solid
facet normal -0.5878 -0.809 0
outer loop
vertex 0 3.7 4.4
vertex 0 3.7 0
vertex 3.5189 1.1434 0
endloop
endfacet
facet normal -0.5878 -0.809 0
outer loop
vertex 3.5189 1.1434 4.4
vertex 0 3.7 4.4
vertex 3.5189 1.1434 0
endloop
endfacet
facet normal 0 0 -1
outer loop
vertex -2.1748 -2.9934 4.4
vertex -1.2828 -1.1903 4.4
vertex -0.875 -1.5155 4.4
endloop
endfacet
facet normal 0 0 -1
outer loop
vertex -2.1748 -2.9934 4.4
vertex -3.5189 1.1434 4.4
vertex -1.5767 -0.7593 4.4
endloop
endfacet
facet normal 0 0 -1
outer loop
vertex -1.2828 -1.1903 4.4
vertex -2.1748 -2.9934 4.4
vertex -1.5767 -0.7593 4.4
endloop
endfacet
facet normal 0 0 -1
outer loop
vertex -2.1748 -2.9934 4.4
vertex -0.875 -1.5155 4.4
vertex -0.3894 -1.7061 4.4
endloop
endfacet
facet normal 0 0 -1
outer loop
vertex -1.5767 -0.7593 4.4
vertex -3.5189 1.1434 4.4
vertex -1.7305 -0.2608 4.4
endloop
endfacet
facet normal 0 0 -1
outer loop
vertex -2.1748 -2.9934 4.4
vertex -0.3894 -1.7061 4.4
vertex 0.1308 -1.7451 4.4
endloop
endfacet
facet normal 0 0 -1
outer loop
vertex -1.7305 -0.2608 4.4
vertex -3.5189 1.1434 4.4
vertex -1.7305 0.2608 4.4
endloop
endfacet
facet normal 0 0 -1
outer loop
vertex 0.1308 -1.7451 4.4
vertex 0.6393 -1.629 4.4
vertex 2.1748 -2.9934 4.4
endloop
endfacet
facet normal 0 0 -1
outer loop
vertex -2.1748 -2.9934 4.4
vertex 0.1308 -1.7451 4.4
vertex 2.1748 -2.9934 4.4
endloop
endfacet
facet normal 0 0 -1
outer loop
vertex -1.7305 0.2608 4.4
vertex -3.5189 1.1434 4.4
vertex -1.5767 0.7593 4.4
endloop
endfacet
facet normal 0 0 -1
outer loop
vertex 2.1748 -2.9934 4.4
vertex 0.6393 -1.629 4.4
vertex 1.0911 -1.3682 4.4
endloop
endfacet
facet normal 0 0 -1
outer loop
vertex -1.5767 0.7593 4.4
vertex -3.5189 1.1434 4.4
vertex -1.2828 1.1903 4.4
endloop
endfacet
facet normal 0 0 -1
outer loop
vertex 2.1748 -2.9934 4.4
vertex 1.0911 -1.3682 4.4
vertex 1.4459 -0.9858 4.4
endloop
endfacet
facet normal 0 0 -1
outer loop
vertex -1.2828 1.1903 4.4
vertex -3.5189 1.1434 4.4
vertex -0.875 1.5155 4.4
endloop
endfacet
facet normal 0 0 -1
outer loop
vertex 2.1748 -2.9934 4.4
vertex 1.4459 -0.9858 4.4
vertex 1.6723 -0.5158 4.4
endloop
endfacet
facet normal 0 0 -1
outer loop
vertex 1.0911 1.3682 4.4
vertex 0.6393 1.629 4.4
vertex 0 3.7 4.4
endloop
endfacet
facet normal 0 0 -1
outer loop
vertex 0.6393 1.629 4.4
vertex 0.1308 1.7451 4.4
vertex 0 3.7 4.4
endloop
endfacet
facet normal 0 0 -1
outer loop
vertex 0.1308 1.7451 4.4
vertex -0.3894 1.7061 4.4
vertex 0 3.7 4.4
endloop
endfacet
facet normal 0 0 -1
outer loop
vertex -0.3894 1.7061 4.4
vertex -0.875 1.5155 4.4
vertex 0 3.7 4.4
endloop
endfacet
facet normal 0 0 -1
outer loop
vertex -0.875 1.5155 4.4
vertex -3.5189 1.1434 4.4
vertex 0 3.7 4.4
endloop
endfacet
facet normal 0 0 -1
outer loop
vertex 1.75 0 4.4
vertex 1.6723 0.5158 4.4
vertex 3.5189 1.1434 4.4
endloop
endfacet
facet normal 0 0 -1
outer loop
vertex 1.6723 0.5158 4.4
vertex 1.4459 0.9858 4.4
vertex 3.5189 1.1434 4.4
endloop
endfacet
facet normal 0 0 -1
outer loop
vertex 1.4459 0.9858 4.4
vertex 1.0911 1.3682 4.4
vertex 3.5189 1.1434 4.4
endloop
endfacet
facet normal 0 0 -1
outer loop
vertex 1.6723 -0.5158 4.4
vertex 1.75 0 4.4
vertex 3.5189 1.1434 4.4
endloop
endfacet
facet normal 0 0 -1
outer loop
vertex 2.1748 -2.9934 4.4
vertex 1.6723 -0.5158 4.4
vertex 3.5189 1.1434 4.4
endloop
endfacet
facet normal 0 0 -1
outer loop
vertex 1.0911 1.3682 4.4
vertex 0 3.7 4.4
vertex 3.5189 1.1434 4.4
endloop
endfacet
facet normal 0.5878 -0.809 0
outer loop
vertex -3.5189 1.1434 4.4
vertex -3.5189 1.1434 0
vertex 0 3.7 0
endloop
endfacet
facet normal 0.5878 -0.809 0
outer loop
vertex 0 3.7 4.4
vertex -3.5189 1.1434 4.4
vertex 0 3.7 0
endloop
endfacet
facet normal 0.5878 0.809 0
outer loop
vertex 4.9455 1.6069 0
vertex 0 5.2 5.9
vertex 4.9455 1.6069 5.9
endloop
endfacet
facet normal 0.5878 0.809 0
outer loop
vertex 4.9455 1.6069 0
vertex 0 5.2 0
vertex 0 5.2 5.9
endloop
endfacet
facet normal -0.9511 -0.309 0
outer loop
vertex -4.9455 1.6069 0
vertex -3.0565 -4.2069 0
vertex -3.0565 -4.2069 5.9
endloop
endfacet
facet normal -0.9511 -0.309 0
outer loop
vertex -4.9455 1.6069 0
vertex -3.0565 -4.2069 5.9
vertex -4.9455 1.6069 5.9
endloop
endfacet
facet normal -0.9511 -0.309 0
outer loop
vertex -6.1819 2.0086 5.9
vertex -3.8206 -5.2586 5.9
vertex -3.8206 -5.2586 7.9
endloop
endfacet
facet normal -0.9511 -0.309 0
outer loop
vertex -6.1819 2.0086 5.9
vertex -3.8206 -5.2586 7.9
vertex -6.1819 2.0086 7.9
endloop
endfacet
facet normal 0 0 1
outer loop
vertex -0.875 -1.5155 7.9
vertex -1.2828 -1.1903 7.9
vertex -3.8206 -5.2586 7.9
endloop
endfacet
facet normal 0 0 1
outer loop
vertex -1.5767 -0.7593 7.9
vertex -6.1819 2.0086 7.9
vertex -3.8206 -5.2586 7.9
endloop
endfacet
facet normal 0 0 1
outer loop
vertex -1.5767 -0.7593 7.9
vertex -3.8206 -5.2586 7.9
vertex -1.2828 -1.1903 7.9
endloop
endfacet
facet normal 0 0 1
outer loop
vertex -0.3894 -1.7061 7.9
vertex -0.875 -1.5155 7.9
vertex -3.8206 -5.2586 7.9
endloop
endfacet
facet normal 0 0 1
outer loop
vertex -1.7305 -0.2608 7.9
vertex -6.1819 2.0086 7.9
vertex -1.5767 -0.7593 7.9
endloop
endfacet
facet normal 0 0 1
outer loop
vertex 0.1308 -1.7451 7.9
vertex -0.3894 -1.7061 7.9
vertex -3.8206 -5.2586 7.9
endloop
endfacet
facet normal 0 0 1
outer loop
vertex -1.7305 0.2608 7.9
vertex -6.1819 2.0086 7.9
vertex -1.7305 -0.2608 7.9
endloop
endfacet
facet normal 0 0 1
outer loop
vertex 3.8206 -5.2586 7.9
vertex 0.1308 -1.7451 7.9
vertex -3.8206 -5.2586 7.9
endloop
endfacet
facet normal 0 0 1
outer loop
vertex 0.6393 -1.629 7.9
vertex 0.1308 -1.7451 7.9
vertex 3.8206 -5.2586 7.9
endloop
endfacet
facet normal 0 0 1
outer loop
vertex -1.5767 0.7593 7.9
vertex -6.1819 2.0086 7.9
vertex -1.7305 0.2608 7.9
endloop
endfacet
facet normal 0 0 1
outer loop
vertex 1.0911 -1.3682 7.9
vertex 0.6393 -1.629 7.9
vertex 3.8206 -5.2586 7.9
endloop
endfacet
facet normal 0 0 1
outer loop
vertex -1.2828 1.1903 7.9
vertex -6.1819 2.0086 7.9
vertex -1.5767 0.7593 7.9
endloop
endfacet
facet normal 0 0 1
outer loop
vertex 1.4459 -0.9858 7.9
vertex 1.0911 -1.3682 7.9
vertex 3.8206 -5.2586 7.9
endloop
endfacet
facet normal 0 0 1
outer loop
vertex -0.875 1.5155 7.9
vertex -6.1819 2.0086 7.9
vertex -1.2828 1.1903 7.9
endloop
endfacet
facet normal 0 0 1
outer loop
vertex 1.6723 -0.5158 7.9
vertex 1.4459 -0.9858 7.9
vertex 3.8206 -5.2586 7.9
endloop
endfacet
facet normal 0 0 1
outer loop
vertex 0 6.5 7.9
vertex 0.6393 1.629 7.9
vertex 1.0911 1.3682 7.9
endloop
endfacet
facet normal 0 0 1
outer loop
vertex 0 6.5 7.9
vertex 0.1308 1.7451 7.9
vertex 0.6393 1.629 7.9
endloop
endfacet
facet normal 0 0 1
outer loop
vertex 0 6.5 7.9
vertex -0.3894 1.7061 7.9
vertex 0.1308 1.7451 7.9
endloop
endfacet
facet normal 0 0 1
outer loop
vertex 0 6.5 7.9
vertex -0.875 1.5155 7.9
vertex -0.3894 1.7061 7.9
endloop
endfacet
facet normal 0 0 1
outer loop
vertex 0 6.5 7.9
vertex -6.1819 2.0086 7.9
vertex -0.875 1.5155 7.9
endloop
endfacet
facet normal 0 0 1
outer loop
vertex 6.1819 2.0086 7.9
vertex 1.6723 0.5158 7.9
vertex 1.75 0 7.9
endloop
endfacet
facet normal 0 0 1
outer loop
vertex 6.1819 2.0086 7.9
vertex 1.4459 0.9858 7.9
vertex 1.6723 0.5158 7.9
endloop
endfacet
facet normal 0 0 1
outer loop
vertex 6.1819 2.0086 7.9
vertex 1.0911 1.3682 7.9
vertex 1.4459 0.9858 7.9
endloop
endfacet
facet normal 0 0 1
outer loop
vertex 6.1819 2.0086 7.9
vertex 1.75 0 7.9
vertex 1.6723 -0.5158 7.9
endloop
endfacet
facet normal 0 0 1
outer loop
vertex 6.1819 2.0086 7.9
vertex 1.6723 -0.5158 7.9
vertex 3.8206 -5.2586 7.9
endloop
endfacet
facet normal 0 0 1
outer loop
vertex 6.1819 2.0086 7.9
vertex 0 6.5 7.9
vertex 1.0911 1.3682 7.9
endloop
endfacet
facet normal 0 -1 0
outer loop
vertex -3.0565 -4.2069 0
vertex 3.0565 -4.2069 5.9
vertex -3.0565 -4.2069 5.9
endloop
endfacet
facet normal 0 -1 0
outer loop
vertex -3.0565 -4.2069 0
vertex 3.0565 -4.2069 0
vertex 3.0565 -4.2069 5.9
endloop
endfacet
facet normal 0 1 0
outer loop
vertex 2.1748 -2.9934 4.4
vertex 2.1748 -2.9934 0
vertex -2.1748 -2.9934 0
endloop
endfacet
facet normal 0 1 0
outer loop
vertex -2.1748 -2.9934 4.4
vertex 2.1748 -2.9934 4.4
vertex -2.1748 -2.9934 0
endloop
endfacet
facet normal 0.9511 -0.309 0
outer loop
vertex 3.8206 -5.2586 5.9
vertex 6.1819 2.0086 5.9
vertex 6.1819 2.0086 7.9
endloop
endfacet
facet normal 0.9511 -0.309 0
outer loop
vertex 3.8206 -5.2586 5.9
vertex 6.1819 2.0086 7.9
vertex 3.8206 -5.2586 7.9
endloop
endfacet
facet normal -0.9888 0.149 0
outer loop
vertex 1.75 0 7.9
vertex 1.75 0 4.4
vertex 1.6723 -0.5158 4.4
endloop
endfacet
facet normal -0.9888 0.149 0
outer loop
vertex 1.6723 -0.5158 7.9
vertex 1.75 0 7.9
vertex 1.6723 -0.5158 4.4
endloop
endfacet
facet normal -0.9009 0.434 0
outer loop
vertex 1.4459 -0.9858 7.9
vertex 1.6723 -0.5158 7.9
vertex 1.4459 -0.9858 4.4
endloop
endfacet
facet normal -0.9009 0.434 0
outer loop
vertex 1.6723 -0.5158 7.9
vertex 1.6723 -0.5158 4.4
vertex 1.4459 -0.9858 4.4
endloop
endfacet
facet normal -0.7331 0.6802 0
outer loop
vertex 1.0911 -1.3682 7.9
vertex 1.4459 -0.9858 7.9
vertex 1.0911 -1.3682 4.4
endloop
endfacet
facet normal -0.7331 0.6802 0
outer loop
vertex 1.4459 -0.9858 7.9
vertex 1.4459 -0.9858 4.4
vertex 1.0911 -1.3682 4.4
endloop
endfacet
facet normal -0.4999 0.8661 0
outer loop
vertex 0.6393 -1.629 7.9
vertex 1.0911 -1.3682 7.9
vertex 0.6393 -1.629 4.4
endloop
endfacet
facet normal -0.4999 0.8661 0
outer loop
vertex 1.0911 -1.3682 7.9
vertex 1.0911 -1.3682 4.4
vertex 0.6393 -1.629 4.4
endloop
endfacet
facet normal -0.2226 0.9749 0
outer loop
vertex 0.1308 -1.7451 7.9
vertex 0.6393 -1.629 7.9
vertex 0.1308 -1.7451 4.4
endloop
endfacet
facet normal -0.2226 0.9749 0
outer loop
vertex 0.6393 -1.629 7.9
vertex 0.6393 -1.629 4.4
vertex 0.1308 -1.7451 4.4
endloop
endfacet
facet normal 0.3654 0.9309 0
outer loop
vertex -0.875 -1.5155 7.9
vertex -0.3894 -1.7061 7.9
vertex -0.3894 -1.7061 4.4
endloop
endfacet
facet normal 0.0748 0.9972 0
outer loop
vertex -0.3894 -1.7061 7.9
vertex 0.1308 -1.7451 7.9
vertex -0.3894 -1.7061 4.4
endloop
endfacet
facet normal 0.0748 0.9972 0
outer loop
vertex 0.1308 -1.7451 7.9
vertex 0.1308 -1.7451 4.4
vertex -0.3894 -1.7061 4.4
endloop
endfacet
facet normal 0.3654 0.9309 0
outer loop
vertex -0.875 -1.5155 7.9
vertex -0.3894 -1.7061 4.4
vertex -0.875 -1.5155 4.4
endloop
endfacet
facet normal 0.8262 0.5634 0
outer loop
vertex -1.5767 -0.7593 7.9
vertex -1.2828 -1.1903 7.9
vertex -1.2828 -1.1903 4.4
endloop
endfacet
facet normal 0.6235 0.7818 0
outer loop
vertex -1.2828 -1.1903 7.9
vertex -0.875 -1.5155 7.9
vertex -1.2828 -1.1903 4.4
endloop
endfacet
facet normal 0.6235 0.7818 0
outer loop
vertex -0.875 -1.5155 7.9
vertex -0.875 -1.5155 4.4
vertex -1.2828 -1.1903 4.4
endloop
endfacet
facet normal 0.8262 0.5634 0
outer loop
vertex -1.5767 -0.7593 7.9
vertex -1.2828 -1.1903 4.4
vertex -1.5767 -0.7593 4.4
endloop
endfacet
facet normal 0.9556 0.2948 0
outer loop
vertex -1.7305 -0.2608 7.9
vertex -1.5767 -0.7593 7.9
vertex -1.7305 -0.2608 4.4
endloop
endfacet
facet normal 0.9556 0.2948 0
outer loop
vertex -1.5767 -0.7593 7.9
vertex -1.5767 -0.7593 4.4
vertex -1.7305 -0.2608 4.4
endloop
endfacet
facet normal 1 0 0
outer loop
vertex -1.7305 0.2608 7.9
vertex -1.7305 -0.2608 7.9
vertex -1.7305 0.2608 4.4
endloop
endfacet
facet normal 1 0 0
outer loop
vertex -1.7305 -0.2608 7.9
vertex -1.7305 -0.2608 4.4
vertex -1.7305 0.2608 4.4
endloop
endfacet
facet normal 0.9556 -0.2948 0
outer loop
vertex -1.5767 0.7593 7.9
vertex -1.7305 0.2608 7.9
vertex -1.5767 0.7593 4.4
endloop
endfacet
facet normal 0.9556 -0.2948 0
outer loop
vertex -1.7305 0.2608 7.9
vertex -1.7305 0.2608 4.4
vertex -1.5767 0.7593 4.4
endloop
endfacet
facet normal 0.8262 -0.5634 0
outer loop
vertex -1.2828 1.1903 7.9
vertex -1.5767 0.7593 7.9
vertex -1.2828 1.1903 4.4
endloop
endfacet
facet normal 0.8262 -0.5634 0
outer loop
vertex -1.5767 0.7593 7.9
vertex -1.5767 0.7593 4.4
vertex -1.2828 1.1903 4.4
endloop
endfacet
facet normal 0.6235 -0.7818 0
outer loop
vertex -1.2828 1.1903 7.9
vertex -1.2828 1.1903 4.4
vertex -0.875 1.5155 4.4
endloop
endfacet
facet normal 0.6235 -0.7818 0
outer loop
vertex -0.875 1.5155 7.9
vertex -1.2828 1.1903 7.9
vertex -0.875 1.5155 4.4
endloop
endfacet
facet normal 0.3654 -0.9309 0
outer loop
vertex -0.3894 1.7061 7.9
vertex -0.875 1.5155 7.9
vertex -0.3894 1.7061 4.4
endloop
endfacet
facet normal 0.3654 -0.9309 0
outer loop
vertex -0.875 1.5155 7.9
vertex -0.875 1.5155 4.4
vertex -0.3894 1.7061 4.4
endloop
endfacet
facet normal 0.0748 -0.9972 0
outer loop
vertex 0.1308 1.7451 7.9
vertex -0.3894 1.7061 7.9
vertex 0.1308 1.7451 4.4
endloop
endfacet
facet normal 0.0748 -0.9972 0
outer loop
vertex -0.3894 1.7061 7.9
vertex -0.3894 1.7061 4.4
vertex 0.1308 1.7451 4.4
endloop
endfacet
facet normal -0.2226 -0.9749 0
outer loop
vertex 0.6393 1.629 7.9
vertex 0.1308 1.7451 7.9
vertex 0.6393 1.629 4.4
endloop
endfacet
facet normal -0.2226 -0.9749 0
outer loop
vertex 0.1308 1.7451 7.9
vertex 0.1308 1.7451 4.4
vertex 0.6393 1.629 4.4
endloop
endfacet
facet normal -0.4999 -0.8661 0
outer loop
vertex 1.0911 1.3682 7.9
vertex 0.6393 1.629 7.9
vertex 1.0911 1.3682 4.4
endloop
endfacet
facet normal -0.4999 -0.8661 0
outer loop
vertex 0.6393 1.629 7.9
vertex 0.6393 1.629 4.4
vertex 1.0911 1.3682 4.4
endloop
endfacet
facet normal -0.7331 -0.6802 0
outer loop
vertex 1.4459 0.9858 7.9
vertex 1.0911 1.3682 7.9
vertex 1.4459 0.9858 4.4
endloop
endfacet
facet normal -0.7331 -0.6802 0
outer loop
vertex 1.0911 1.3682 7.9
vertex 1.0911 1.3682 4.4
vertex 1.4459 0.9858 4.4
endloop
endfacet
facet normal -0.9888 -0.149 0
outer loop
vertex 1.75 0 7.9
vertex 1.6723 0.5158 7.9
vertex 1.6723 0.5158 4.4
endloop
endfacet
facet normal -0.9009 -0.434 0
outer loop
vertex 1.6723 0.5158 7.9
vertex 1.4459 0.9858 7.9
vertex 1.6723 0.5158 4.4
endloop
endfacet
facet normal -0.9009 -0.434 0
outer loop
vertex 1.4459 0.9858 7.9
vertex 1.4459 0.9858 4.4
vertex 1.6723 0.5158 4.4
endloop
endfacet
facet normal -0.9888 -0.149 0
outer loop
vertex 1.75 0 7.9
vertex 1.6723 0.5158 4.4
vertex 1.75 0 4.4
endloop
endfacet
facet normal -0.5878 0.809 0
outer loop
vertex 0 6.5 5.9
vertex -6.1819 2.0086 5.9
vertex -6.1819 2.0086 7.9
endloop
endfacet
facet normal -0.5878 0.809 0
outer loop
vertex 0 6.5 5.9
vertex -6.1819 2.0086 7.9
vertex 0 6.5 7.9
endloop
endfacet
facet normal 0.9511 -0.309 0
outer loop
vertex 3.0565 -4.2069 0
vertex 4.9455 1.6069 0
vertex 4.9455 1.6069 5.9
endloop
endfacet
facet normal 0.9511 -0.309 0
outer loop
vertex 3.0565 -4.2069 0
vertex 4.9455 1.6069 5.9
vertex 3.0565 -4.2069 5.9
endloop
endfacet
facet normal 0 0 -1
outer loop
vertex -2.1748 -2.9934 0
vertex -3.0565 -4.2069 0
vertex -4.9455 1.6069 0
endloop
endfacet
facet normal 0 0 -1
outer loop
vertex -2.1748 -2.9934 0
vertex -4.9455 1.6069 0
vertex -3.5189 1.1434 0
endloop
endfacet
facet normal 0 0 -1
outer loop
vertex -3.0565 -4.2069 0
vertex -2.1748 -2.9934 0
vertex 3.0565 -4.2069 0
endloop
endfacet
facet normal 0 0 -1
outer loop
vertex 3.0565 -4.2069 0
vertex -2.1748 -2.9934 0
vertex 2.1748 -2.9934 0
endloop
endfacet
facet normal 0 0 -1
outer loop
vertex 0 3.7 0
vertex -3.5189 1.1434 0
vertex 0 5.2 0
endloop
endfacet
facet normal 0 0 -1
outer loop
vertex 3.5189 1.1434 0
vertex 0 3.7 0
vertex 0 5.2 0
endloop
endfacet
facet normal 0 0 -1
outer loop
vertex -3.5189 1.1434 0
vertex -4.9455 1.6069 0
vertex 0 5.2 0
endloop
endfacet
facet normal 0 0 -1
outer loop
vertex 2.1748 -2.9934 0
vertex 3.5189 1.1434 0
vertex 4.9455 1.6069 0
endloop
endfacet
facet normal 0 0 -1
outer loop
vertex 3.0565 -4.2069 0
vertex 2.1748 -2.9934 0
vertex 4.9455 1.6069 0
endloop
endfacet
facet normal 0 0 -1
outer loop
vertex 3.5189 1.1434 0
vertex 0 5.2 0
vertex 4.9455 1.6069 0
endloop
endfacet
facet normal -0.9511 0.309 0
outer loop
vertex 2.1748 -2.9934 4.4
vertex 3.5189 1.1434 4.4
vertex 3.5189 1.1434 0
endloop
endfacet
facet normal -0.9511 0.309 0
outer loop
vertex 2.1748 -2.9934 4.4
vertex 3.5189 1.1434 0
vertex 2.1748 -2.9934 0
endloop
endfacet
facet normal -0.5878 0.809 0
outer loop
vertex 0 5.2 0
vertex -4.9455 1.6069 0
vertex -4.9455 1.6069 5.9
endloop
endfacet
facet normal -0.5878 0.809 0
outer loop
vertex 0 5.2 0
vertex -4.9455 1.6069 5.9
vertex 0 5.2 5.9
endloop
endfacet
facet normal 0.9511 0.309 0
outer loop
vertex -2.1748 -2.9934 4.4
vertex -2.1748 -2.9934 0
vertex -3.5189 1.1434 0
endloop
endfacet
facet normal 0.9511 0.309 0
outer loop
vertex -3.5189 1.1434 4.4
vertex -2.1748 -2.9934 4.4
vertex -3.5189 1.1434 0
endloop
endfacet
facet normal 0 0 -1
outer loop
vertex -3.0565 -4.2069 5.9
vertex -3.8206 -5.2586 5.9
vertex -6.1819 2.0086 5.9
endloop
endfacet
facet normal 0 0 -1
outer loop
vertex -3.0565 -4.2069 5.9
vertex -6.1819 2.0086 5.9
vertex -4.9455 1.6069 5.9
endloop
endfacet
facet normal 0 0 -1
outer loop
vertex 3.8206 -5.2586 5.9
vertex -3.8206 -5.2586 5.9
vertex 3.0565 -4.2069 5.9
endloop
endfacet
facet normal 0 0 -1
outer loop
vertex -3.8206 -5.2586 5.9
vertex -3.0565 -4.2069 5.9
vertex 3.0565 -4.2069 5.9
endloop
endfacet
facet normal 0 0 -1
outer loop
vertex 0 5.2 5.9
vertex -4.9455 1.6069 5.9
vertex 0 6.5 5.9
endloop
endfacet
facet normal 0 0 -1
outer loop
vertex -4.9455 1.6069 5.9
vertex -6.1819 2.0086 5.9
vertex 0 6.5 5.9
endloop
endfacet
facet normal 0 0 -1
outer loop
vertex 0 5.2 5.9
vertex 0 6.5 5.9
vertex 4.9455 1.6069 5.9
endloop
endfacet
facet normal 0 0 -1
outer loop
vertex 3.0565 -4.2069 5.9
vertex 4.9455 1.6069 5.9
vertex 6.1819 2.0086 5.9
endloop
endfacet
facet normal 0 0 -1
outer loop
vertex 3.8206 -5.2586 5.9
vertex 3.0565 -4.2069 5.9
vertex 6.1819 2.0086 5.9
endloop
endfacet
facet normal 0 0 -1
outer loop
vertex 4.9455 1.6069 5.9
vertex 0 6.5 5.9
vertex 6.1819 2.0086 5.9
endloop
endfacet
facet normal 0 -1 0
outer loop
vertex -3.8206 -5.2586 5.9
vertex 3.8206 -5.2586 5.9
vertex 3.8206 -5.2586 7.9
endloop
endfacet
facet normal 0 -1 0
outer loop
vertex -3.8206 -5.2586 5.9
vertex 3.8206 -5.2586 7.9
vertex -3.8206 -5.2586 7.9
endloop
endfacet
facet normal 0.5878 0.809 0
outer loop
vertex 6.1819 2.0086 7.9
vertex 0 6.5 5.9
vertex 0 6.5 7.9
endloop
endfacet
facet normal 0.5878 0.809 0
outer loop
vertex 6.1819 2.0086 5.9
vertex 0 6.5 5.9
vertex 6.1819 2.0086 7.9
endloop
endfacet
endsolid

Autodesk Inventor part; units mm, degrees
ref_plane "YZ Plane" through (0, 0, 0) normal (1, 0, 0) x (0, 1, 0)
ref_plane "XZ Plane" through (0, 0, 0) normal (0, 1, 0) x (-1, 0, 0)
ref_plane "XY Plane" through (0, 0, 0) normal (0, 0, 1) x (1, 0, 0)
sketch "Skizze1" plane through (0, 0, 0) normal (0, 0, 1) x (1, 0, 0)
  circle A0 centre (0, 0) radius 3.7 construction
  line L0 (0, 3.7) -> (3.5189, 1.1434)
  line L1 (3.5189, 1.1434) -> (2.1748, -2.9934)
  line L2 (2.1748, -2.9934) -> (-2.1748, -2.9934)
  line L3 (-2.1748, -2.9934) -> (-3.5189, 1.1434)
  line L4 (-3.5189, 1.1434) -> (0, 3.7)
  circle A1 centre (0, 0) radius 5.2 construction
  line L5 (0, 5.2) -> (4.9455, 1.6069)
  line L6 (4.9455, 1.6069) -> (3.0565, -4.2069)
  line L7 (3.0565, -4.2069) -> (-3.0565, -4.2069)
  line L8 (-3.0565, -4.2069) -> (-4.9455, 1.6069)
  line L9 (-4.9455, 1.6069) -> (0, 5.2)
  circle A2 centre (0, 0) radius 1.75
  circle A3 centre (0, 0) radius 6.5 construction
  line L10 (-6.1819, 2.0086) -> (0, 6.5)
  line L11 (0, 6.5) -> (6.1819, 2.0086)
  line L12 (6.1819, 2.0086) -> (3.8206, -5.2586)
  line L13 (3.8206, -5.2586) -> (-3.8206, -5.2586)
  line L14 (-3.8206, -5.2586) -> (-6.1819, 2.0086)
  circle A4 centre (0, 0) radius 4.2 construction
  line L15 (0, 9.1) -> (0, -9.1) construction
  circle A5 centre (0, 0) radius 5.7 construction
  dimension "d9" = 13
  dimension "d8" = 3.5
  dimension "d14" = 8.4
  dimension "d15" = 0.5
  dimension "d16" = 11.4
  dimension "d18" = 0.5
extrude "Extrusion1" add sketch "Skizze1" along normal blind 4.4 contours L5 L6 L7 L8 L9
extrude "Extrusion2" add sketch "Skizze1" along normal blind 1.5 from surface at 4.4 contours L0 L1 L2 L3 L4 | L5 L6 L7 L8 L9
extrude "Extrusion3" add sketch "Skizze1" along normal blind 2 from surface at 5.9 contours L0 L1 L2 L3 L4 | L5 L6 L7 L8 L9 | L10 L11 L12 L13 L14
properties part number "gearNotch"
